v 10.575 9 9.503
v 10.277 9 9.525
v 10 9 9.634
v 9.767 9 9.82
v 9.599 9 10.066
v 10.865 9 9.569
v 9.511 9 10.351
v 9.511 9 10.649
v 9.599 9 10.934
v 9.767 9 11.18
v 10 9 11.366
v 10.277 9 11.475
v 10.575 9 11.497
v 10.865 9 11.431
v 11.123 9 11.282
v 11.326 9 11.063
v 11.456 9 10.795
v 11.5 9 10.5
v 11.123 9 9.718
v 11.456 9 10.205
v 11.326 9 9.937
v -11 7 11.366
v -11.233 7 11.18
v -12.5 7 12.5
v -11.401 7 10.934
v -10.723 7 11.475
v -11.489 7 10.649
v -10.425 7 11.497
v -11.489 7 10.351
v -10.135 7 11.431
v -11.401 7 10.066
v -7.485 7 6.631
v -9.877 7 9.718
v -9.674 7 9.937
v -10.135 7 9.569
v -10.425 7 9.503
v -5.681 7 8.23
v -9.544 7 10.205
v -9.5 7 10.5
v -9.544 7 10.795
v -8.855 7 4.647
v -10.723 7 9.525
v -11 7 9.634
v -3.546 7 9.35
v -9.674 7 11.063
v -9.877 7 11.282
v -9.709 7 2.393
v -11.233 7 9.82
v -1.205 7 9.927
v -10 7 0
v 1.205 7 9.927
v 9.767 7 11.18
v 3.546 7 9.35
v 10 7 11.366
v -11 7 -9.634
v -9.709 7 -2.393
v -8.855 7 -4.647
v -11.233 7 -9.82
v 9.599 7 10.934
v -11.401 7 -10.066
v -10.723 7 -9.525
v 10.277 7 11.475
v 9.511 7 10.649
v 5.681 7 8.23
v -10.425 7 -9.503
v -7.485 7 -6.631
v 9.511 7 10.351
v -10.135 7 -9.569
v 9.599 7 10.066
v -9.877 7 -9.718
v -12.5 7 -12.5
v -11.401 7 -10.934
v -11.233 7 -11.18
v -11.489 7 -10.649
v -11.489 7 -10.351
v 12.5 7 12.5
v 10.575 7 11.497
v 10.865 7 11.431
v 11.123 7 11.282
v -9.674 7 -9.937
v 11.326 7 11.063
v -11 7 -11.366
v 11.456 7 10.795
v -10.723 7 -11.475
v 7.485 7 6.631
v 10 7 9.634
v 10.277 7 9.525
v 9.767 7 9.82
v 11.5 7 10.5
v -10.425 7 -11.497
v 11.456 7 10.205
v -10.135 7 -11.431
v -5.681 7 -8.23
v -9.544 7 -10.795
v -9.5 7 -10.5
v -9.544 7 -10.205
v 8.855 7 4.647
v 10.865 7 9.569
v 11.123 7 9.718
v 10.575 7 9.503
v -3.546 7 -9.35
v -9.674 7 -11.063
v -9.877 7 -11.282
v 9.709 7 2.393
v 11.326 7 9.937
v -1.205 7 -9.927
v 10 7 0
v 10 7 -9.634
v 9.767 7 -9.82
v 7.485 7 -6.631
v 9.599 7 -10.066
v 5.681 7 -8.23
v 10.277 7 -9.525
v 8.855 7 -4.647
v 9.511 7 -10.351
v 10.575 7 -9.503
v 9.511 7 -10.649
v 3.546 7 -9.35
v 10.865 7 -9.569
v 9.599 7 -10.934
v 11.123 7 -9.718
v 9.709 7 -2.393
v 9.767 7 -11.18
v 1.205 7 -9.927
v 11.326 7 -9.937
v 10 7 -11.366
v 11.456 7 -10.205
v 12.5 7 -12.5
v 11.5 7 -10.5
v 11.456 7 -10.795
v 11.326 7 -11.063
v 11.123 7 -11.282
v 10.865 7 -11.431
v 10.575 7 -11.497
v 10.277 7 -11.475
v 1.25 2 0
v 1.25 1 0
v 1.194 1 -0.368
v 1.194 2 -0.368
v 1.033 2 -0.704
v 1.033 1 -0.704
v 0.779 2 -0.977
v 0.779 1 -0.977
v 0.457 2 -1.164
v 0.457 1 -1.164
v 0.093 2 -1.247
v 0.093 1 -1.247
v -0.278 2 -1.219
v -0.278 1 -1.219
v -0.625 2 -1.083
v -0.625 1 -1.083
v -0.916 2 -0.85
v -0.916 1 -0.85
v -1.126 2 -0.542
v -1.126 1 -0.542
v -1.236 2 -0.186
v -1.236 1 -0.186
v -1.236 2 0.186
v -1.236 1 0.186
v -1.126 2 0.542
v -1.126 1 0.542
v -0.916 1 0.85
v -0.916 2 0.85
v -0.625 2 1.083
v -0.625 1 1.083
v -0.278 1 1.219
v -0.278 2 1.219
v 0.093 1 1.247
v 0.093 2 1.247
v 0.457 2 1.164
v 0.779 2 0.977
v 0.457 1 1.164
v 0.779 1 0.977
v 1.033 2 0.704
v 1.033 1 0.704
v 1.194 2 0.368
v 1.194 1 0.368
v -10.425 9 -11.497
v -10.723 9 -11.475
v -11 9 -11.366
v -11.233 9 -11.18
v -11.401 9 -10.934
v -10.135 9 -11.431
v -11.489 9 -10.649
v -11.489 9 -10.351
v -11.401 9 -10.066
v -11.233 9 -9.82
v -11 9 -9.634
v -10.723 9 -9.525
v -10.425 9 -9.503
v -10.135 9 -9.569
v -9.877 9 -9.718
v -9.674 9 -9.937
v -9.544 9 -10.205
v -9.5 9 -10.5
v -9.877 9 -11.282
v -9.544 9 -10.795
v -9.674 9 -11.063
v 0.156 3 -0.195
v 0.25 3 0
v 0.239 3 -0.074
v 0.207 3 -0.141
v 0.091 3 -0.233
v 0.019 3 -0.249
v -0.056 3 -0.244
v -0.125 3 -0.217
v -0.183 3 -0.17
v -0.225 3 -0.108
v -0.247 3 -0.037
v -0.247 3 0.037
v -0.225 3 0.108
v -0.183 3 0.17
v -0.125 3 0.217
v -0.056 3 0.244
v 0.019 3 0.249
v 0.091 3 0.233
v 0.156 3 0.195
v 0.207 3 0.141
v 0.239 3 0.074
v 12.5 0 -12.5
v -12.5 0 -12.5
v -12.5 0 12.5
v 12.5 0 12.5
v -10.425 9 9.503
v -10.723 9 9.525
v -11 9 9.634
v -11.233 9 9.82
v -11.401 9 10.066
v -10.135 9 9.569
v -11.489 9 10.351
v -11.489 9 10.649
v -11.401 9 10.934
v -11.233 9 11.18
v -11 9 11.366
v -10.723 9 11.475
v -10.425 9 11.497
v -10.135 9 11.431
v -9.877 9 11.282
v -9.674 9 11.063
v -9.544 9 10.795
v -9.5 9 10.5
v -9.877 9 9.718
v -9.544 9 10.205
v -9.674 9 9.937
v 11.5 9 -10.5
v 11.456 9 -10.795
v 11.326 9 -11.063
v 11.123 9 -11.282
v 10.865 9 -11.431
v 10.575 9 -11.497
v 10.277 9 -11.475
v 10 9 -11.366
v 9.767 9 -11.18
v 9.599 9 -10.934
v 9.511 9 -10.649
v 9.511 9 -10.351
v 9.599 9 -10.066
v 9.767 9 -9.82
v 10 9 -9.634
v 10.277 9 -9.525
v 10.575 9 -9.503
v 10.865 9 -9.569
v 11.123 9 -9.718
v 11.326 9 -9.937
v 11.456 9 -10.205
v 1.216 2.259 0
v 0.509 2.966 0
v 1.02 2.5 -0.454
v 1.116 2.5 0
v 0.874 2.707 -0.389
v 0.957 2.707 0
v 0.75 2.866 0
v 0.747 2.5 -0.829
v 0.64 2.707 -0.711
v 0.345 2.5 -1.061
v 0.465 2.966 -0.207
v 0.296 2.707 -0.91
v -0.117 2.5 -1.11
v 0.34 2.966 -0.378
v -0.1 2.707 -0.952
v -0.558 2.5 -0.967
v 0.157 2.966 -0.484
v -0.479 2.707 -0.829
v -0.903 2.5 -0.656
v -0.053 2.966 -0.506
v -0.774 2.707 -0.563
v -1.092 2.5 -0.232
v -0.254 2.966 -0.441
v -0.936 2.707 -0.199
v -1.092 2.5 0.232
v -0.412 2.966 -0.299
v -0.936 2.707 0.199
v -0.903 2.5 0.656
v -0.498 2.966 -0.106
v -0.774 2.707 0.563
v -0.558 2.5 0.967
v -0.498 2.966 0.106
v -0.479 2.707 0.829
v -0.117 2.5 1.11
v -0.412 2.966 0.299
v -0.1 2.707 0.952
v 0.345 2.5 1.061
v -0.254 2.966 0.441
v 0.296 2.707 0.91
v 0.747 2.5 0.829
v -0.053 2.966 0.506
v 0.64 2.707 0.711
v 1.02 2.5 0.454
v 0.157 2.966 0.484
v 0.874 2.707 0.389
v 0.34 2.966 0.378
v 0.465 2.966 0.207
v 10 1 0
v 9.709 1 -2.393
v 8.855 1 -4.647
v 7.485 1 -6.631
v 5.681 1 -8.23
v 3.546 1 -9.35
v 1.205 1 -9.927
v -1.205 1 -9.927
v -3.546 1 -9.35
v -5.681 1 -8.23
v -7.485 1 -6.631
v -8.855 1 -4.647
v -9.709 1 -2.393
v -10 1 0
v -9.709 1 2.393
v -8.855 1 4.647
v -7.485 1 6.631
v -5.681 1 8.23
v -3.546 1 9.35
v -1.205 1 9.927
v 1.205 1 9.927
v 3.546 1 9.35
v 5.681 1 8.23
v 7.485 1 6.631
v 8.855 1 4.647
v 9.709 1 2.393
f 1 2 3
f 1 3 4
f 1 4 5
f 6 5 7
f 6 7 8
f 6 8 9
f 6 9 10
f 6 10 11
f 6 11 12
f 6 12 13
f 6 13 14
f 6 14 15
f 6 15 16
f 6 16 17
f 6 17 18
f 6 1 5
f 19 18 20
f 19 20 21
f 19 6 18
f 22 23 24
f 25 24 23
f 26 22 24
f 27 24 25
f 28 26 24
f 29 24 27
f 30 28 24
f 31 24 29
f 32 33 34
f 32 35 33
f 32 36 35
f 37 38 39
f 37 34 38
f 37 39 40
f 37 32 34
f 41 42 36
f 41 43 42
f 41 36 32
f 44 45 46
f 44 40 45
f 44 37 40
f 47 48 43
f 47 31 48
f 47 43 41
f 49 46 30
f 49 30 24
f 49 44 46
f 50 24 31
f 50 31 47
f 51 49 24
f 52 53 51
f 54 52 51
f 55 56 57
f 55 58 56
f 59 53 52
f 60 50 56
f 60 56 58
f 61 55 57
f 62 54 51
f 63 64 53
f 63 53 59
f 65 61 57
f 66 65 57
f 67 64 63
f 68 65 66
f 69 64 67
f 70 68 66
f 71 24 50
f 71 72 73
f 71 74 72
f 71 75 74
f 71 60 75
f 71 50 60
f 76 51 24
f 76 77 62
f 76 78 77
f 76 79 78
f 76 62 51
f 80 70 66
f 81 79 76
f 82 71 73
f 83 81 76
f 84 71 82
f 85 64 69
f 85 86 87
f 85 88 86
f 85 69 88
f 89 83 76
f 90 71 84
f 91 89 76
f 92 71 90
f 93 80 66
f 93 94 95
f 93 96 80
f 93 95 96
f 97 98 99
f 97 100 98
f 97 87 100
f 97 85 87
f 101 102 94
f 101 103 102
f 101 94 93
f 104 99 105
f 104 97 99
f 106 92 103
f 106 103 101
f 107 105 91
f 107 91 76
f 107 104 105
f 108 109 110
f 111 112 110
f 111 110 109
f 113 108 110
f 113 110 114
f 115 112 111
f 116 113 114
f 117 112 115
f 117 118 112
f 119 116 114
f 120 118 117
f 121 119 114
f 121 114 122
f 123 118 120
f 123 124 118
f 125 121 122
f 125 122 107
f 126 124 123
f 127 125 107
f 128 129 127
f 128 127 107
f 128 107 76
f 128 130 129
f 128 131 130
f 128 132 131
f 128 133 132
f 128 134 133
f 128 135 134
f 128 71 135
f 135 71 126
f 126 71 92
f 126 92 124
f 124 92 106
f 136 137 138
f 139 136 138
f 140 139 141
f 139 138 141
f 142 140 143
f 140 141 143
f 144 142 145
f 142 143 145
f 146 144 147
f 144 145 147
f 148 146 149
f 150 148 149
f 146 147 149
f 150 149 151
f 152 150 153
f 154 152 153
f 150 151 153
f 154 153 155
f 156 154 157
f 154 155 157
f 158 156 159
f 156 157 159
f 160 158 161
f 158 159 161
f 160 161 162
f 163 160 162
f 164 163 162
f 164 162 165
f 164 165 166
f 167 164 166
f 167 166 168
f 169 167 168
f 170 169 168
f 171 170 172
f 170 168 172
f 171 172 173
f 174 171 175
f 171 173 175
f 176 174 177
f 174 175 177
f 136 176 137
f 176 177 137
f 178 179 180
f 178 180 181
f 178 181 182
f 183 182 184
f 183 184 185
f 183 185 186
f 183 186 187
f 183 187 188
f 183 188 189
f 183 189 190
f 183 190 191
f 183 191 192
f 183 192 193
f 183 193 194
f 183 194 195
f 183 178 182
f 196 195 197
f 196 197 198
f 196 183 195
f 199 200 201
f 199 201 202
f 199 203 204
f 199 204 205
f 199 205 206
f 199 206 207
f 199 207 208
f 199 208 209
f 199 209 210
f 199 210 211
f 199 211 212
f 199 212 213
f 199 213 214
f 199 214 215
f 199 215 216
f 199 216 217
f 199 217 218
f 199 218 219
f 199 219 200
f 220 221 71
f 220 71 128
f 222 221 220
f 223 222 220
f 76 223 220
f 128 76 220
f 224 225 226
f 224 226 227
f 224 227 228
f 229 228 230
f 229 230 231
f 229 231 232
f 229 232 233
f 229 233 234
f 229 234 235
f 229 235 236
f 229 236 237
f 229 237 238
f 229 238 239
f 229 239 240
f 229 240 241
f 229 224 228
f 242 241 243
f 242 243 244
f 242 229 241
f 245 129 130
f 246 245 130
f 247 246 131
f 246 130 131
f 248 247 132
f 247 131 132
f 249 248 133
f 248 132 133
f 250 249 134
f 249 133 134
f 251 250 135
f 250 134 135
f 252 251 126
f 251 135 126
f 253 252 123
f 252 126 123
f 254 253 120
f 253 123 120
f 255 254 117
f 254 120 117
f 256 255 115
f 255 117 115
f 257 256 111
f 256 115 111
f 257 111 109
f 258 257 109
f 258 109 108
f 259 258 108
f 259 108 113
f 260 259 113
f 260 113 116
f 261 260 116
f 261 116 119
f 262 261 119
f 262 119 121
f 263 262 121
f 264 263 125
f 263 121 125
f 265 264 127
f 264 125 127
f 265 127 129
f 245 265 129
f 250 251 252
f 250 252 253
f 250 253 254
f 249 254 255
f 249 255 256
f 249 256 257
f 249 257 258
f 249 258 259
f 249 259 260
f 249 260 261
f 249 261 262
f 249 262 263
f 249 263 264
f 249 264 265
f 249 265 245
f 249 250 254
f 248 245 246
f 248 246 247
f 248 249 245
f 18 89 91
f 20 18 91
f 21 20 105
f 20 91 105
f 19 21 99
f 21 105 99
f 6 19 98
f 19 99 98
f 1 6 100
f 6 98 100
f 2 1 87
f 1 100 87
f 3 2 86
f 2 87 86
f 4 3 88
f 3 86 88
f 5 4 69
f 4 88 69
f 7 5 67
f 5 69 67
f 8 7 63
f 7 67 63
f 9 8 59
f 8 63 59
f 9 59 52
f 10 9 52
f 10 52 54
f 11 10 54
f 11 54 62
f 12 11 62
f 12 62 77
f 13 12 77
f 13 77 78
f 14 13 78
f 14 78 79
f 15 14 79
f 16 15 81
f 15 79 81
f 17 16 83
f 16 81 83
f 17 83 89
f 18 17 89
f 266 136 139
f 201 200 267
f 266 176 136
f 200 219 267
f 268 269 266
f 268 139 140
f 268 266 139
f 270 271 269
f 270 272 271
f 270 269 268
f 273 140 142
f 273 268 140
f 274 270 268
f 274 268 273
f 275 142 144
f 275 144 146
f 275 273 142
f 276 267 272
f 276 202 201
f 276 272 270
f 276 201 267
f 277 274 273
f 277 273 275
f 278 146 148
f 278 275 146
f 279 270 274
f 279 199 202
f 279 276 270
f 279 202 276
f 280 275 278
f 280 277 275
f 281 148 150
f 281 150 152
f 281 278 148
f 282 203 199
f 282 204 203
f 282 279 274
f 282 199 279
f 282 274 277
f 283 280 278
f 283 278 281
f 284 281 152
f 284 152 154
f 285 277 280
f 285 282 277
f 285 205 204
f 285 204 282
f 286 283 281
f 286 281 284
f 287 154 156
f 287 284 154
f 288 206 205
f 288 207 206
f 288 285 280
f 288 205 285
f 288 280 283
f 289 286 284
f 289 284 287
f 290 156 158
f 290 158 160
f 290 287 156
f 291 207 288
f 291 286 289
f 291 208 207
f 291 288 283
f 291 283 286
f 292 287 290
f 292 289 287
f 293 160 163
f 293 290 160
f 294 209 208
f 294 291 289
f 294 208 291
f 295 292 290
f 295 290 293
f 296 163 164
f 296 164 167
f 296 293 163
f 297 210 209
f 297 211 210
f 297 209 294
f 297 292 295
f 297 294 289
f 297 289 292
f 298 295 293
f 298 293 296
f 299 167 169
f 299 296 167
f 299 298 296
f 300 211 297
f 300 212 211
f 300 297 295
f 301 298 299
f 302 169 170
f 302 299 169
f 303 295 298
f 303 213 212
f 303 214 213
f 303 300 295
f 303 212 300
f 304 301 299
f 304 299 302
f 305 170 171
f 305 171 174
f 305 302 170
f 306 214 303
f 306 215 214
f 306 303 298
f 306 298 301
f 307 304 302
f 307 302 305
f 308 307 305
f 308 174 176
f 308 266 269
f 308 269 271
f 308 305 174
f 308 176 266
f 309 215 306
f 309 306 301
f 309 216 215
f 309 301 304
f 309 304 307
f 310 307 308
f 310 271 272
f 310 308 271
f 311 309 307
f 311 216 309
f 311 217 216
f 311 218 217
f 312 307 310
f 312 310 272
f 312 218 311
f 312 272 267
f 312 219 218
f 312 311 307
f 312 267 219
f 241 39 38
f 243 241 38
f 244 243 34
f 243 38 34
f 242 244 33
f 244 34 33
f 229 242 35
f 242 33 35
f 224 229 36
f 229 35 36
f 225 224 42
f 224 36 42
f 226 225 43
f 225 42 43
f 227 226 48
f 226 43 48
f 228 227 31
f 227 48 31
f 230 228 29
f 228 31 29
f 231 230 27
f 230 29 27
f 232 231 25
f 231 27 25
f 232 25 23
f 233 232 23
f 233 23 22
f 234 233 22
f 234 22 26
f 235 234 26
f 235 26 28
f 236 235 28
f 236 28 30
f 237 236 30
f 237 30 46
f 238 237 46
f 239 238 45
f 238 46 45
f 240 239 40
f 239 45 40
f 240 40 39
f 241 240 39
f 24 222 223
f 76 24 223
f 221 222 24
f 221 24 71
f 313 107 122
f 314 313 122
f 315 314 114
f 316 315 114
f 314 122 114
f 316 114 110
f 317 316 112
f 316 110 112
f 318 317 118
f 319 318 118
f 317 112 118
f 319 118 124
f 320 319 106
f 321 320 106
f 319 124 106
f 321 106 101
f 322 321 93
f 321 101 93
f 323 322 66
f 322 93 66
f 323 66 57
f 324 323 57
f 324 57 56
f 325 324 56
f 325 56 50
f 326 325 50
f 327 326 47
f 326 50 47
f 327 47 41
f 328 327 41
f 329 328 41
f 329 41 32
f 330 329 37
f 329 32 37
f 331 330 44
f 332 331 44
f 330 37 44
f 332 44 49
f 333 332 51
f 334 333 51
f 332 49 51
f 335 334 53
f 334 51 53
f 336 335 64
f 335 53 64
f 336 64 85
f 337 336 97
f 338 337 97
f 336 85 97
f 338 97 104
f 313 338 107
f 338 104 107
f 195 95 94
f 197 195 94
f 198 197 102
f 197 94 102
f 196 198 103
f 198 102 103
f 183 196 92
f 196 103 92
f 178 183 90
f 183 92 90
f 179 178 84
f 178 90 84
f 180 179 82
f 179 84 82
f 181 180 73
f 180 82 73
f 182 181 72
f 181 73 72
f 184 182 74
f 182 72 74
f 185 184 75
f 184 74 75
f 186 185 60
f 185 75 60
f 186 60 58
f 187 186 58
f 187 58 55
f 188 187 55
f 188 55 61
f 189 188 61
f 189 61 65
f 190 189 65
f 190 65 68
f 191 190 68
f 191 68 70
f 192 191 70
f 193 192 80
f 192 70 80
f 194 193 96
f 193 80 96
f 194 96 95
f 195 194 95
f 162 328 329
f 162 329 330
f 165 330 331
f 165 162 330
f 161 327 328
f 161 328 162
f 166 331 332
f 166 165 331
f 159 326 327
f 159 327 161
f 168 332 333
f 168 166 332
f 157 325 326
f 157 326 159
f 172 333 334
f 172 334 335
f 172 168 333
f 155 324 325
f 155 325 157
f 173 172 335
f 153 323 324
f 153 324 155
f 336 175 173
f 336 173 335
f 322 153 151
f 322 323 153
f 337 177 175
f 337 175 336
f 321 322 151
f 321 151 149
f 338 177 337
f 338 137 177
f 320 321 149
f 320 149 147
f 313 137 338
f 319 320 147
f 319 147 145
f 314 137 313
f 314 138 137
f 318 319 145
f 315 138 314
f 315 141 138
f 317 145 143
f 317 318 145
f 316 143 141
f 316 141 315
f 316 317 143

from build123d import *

# Parameters (mm, degrees)
SKETCH1_W           = 25
SKETCH1_H           = 25
BOSS_EXTRUDE1_DEPTH = 7
SKETCH2_R           = 10
CUT_EXTRUDE1_DEPTH  = 6
SKETCH3_R           = 1.25
BOSS_EXTRUDE2_DEPTH = 2
FILLET1_R           = 1
SKETCH4_R           = 1
BOSS_EXTRUDE3_DEPTH = 2


with BuildPart() as part:
    # Sketch1 → Boss-Extrude1 (new body)
    with BuildSketch(Plane(origin=(0, 0, 0), x_dir=(1, 0, 0), z_dir=(0, 1, 0))):
        Rectangle(SKETCH1_W, SKETCH1_H)
    extrude(amount=BOSS_EXTRUDE1_DEPTH)

    # Sketch2 → Cut-Extrude1 (cut)
    with BuildSketch(Plane(origin=(0, 7, 0), x_dir=(1, 0, 0), z_dir=(0, 1, 0))):
        Circle(SKETCH2_R)
    extrude(amount=-CUT_EXTRUDE1_DEPTH, mode=Mode.SUBTRACT)

    # Sketch3 → Boss-Extrude2 (add)
    with BuildSketch(Plane(origin=(0, 1, 0), x_dir=(1, 0, 0), z_dir=(0, 1, 0))):
        Circle(SKETCH3_R)
    extrude(amount=BOSS_EXTRUDE2_DEPTH)

    # Fillet1
    fillet1_edges = [part.edges().sort_by_distance(p)[0] for p in [
        (-1.25, 3, 0),
    ]]
    fillet(fillet1_edges, radius=FILLET1_R)

    # Sketch4 → Boss-Extrude3 (add)
    with BuildSketch(Plane(origin=(0, 7, 0), x_dir=(1, 0, 0), z_dir=(0, 1, 0))):
        with Locations((-10.5, 10.5)):
            Circle(SKETCH4_R)
        with Locations((10.5, 10.5)):
            Circle(SKETCH4_R)
        with Locations((10.5, -10.5)):
            Circle(SKETCH4_R)
        with Locations((-10.5, -10.5)):
            Circle(SKETCH4_R)
    extrude(amount=BOSS_EXTRUDE3_DEPTH)


solid = part.part
